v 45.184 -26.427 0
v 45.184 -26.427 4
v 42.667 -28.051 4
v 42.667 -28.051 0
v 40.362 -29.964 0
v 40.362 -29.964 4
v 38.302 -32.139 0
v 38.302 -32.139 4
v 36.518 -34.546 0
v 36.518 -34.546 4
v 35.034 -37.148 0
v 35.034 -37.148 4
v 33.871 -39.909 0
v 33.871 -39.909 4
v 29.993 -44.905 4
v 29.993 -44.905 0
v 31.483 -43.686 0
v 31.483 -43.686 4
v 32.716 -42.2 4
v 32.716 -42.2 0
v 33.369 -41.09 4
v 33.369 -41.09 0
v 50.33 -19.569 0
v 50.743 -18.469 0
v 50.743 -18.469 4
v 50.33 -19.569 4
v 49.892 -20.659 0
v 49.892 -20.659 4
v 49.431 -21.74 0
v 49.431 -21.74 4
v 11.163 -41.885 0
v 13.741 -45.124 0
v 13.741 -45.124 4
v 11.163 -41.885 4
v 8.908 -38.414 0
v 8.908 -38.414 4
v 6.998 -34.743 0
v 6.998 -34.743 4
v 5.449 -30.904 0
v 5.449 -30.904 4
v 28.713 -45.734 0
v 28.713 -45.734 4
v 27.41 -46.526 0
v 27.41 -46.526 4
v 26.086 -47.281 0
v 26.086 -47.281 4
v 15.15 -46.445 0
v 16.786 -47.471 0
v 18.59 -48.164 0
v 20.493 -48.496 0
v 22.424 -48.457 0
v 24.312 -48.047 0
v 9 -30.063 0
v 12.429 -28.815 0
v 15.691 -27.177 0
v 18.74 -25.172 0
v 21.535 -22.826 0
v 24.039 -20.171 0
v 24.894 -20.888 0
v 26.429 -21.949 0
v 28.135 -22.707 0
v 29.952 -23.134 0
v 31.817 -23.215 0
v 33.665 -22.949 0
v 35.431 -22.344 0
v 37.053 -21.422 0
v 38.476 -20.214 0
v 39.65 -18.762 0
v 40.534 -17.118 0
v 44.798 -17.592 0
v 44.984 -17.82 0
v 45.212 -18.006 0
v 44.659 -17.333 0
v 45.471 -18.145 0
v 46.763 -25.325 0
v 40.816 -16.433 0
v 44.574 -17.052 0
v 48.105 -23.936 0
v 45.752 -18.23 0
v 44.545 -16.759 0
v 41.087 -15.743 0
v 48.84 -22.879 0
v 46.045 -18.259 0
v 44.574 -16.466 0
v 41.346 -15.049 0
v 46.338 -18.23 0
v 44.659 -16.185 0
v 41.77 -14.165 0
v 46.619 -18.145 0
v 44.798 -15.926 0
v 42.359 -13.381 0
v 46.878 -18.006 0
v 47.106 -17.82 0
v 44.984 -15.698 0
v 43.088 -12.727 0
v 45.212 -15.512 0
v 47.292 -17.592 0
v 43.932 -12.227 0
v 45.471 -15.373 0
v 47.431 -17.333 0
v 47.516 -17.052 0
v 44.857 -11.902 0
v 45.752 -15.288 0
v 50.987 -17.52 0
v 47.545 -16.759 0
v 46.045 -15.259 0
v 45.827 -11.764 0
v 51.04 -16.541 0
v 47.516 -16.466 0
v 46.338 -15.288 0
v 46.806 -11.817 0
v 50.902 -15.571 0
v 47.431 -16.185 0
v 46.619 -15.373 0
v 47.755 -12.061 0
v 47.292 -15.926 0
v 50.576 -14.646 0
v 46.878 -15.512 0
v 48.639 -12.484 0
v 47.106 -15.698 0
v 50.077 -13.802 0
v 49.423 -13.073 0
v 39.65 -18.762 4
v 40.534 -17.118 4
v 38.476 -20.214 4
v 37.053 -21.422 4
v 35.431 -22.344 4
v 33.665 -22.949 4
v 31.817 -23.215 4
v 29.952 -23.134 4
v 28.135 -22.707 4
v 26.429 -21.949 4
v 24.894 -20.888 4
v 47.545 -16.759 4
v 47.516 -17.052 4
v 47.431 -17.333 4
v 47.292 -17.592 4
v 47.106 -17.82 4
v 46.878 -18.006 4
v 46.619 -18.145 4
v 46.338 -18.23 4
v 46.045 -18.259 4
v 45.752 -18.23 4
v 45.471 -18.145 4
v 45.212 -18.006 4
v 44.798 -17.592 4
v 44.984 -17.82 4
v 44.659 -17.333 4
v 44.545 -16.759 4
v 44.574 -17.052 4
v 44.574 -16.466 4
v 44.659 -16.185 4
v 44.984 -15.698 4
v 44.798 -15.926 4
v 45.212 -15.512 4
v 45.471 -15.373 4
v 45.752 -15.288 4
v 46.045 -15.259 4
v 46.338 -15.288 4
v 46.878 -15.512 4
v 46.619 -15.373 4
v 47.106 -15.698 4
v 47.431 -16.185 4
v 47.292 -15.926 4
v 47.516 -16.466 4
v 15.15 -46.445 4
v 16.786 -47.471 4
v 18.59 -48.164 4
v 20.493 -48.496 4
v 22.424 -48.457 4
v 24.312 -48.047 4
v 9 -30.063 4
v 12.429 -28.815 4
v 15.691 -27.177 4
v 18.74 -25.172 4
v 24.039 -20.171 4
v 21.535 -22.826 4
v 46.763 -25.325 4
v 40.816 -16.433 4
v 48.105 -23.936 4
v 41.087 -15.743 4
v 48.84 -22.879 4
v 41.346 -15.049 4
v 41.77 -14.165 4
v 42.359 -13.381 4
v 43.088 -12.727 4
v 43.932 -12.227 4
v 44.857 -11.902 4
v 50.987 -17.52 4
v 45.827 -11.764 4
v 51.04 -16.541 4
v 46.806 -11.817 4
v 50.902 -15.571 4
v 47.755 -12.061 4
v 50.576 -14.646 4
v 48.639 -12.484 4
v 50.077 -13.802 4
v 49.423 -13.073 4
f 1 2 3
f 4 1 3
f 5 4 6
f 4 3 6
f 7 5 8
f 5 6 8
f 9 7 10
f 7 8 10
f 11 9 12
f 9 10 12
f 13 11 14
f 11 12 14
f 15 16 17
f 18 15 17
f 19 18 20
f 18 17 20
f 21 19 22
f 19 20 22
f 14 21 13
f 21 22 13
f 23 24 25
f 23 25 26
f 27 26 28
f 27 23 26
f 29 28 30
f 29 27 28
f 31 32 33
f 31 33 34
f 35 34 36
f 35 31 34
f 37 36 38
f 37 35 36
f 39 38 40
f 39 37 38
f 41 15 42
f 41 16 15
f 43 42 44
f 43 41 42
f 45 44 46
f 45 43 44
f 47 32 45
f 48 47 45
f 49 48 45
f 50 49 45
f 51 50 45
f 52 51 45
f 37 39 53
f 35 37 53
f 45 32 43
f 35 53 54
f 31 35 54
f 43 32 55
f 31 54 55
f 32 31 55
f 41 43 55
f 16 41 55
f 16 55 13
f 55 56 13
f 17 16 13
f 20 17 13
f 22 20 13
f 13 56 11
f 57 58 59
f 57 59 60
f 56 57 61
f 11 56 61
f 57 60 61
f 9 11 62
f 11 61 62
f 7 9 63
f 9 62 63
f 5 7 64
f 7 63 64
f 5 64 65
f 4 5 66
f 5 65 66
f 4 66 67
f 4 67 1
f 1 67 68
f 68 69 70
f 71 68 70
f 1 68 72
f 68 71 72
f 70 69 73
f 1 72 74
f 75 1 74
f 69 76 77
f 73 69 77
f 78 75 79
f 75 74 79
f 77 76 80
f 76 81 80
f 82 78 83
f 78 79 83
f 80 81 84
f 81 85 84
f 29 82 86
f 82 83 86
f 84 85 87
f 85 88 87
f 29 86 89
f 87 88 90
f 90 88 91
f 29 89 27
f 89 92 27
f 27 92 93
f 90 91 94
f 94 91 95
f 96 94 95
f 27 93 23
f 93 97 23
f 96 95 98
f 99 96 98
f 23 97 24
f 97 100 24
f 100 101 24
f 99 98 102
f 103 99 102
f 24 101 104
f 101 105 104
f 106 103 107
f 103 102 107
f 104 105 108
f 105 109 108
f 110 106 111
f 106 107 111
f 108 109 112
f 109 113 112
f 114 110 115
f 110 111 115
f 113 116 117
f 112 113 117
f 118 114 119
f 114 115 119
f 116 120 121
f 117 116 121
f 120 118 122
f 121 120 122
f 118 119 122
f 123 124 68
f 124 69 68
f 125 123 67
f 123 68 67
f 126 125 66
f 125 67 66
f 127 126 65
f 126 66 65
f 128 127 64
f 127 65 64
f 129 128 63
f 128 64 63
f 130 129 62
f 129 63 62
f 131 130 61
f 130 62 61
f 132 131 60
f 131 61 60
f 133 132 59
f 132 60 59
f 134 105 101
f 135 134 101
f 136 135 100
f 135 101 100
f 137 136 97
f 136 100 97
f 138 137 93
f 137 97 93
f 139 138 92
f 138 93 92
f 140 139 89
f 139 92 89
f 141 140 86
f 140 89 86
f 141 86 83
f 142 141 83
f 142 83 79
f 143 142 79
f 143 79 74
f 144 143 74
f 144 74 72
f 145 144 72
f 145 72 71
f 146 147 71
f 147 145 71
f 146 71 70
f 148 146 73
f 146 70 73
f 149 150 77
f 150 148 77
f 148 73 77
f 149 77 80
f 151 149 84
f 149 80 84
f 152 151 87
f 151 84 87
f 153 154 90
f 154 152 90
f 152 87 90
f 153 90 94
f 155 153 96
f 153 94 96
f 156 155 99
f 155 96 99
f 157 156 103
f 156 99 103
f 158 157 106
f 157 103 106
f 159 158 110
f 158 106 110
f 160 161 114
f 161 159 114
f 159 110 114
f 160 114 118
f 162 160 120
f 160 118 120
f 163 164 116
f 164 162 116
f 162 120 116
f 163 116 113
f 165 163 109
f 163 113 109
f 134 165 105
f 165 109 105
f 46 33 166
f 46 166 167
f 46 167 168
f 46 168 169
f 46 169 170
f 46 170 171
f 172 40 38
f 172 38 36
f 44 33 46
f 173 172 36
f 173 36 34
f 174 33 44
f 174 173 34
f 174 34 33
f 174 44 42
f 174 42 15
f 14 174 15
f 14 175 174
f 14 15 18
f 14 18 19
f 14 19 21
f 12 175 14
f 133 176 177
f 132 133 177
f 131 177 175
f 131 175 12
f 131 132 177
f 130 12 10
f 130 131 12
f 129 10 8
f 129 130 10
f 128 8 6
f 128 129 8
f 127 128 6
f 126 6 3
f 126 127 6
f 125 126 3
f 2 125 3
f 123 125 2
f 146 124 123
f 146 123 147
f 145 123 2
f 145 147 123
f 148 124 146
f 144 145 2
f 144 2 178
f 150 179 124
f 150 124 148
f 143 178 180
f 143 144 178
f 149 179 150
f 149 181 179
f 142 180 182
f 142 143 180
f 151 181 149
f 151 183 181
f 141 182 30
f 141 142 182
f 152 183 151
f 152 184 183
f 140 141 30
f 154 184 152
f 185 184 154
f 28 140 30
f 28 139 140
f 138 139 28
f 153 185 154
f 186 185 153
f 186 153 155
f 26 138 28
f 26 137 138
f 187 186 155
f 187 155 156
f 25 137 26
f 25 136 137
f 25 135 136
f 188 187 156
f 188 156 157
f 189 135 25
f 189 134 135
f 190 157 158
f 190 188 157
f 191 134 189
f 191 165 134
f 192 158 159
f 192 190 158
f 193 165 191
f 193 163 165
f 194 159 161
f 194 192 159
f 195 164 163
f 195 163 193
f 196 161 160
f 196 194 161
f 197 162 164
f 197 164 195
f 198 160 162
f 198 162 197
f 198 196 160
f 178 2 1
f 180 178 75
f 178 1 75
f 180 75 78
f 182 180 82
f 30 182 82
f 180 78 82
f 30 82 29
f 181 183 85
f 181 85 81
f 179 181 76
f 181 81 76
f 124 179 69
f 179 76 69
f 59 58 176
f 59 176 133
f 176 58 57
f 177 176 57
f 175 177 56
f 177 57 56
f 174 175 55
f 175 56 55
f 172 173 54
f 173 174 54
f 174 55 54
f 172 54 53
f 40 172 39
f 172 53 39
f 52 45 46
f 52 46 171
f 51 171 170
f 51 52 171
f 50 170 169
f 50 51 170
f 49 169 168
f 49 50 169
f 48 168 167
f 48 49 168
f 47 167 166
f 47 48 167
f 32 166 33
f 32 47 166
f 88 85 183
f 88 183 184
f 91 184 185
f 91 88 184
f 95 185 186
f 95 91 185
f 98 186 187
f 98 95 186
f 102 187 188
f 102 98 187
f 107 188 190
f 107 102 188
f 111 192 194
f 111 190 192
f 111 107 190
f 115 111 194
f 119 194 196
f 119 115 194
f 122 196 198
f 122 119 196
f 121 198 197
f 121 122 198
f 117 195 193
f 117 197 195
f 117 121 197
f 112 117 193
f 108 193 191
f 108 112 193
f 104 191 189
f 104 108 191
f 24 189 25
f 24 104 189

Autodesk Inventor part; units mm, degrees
ref_plane "YZ Plane" through (0, 0, 0) normal (1, 0, 0) x (0, 1, 0)
ref_plane "XZ Plane" through (0, 0, 0) normal (0, 1, 0) x (-1, 0, 0)
ref_plane "XY Plane" through (0, 0, 0) normal (0, 0, 1) x (1, 0, 0)
sketch "Sketch1" plane through (0, 0, 0) normal (0, 0, 1) x (1, 0, 0)
  circle A0 centre (46.0449, -16.759) radius 4 construction
  spline S0 degree 3 poles (32.2129, 20.8318) (30.525, 21.8832) (29.0415, 23.2334) (25.9174, 26.8655) (24.5253, 29.2164) (23.4072, 31.3618) knots 0 0 0 0 0.391133 0.391133 0.939024 0.939024 0.939024 0.939024 construction
  arc A1 (50.7434, -18.4691) -> (41.3465, -15.0489) centre (46.0449, -16.759) ccw
  circle A2 centre (46.0449, -16.759) radius 1.5
  arc A3 (5.4493, -30.9044) -> (24.0394, -20.1714) centre (0, 0) ccw
  arc A4 (26.086, -47.2813) -> (50.7434, -18.4691) centre (0, 0) ccw
  arc A5 (40.5335, -17.1182) -> (41.3465, -15.0489) centre (0, 0) ccw
  circle A6 centre (0, 0) radius 49 construction
  line L0 (46.0449, -16.759) -> (0, 0) construction
  line L1 (0, 0) -> (49, 0) construction
  line L2 (5.4493, -30.9044) -> (0, 0) construction
  line L3 (24.0394, -20.1714) -> (0, 0) construction
  line L4 (24.0394, -20.1714) -> (24.8935, -20.8881)
  line L5 (0, 0) -> (15.6906, -27.1769) construction
  arc A7 (24.8935, -20.8881) -> (40.5335, -17.1182) centre (31.3214, -13.2277) ccw
  arc A8 (5.4493, -30.9044) -> (13.7408, -45.1235) centre (46.0449, -16.759) ccw
  arc A9 (13.7408, -45.1235) -> (26.086, -47.2813) centre (21.2552, -38.5255) ccw
  point P0 (33.706, -28.2827)
  dimension "d2" = 62.7624
  dimension "d3" = 10
  dimension "d4" = 3
  dimension "d5" = 8
  dimension "d42" = 98
  dimension "d45" = 20
  dimension "d46" = 40
  dimension "d47" = 20
  dimension "d48" = 60
  dimension "d49" = 10
  dimension "d51" = 10
extrude "Extrusion1" add sketch "Sketch1" along normal blind 4
sketch "Sketch10" plane through (0, 0, 4) normal (0, 0, 1) x (1, 0, 0)
  arc A0 (26.086, -47.2813) -> (50.7434, -18.4691) centre (0, 0) ccw projected
  arc A1 (47.7831, -25.1551) -> (33.0704, -42.689) centre (57.4533, -48.2091) ccw
  arc A2 (40.5335, -17.1182) -> (41.3465, -15.0489) centre (0, 0) ccw projected
  line L0 (57.4533, -48.2091) -> (0, 0) construction
  line L1 (0, 0) -> (52.518, 0) construction
  dimension "d54" = 40
  dimension "d55" = 25
  dimension "d56" = 75
extrude "Extrusion9" cut sketch "Sketch10" against normal blind 10
fillet "Fillet8" radius 10 2 edges at (47.7831, -25.1551, 2) (33.0704, -42.689, 2)
equation "\"d51\" = d49"
properties part number "launcher.latch"
